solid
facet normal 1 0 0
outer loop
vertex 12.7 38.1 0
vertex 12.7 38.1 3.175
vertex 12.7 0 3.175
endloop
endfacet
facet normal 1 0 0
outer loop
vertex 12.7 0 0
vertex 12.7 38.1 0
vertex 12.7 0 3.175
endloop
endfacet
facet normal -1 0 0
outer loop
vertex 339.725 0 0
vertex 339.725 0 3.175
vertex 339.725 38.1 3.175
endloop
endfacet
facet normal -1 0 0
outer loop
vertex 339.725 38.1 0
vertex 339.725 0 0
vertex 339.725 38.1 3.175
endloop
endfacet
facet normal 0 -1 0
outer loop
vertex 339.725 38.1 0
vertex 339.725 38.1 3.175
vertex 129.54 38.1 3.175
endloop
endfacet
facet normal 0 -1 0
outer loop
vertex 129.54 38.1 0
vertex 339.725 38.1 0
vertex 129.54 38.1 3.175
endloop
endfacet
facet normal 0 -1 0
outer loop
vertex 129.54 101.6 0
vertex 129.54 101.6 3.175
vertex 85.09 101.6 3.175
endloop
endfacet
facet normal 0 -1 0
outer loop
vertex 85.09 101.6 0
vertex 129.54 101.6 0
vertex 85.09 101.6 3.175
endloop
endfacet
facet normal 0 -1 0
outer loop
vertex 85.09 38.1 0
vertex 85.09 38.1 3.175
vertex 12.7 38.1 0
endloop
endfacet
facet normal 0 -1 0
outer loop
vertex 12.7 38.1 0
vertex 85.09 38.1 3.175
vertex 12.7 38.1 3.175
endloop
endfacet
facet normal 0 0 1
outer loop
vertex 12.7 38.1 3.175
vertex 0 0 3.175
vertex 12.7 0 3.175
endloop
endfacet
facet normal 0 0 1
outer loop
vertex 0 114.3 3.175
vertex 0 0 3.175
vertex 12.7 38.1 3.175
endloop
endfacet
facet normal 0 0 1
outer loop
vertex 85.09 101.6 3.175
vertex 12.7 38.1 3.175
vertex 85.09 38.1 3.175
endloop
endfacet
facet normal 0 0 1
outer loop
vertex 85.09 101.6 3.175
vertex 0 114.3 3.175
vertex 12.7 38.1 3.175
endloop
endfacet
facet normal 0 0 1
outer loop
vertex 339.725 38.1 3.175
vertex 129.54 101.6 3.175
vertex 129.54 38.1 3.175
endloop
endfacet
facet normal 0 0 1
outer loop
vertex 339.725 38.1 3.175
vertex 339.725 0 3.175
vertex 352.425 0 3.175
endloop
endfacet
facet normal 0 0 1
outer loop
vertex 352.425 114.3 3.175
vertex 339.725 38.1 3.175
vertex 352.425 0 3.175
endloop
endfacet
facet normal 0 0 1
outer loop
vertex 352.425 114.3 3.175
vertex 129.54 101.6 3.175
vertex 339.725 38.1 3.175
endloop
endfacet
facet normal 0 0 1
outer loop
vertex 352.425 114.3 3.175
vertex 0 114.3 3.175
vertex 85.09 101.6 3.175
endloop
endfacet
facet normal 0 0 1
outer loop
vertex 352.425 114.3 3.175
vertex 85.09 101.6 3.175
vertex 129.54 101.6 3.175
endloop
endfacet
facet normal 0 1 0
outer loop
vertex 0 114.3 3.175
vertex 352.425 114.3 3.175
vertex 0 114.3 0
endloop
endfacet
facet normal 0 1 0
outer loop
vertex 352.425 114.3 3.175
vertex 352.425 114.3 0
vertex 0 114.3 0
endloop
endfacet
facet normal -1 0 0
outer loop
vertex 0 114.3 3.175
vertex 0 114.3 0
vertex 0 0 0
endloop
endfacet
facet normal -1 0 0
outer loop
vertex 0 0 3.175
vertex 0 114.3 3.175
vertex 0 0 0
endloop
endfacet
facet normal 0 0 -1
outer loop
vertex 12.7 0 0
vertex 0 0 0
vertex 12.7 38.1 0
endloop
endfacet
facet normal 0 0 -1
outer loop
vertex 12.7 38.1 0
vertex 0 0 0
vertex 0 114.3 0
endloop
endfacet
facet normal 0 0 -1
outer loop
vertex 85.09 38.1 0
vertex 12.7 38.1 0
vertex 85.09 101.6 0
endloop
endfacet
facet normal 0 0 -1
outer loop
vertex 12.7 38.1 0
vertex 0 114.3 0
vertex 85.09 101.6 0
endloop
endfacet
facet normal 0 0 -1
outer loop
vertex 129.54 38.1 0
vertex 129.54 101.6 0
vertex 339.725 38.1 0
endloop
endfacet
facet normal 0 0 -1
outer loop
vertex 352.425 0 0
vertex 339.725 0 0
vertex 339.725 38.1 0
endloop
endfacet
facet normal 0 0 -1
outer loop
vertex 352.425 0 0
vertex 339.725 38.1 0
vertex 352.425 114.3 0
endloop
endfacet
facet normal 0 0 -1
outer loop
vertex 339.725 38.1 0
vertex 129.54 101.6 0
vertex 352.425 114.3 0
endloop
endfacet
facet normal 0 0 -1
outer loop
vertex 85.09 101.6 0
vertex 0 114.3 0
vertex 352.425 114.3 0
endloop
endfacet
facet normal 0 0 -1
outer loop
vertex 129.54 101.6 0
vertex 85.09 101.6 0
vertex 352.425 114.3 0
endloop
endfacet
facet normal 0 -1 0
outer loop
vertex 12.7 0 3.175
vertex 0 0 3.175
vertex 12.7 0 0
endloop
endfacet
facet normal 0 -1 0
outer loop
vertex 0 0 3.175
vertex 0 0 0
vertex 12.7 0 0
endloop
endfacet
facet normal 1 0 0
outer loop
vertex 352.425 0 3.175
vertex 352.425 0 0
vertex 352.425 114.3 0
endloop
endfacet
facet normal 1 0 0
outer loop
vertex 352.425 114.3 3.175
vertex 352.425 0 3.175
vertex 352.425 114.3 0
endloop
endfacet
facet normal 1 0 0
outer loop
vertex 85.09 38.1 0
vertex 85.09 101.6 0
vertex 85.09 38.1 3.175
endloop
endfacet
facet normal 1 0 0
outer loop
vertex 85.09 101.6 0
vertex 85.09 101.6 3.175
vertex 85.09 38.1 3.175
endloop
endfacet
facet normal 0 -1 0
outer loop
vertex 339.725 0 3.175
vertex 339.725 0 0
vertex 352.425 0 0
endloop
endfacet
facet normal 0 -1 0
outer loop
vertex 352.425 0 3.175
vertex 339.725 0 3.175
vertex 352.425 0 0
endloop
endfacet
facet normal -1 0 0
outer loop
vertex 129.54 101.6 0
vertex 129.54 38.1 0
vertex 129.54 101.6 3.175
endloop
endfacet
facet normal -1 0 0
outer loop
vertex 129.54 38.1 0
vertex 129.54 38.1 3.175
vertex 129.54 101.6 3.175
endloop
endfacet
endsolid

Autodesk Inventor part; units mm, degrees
ref_plane "YZ Plane" through (0, 0, 0) normal (1, 0, 0) x (0, 1, 0)
ref_plane "XZ Plane" through (0, 0, 0) normal (0, 1, 0) x (-1, 0, 0)
ref_plane "XY Plane" through (0, 0, 0) normal (0, 0, 1) x (1, 0, 0)
sketch "Sketch1" plane through (0, 0, 0) normal (0, 0, 1) x (1, 0, 0)
  line L0 (0, 0) -> (352.425, 0)
  line L1 (352.425, 0) -> (352.425, 114.3)
  line L2 (352.425, 114.3) -> (0, 114.3)
  line L3 (0, 114.3) -> (0, 0)
  dimension "d0" = 352.425
  dimension "d1" = 114.3
extrude "Extrusion1" add sketch "Sketch1" along normal blind 3.175
sketch "Sketch2" plane through (0, 0, 3.175) normal (0, 0, 1) x (1, 0, 0)
  line L0 (12.7, 0) -> (339.725, 0)
  line L1 (339.725, 0) -> (339.725, 38.1)
  line L2 (339.725, 38.1) -> (12.7, 38.1)
  line L3 (12.7, 38.1) -> (12.7, 0)
  line L4 (0, 114.3) -> (0, 0) projected
  line L5 (352.425, 0) -> (352.425, 114.3) projected
  dimension "d4" = 12.7
  dimension "d5" = 12.7
  dimension "d6" = 38.1
extrude "Extrusion2" cut sketch "Sketch2" against normal blind 25.4
sketch "Sketch3" plane through (0, 0, 3.175) normal (0, 0, 1) x (1, 0, 0)
  line L0 (339.725, 38.1) -> (12.7, 38.1) projected
  line L1 (85.09, 38.1) -> (129.54, 38.1)
  line L2 (129.54, 38.1) -> (129.54, 101.6)
  line L3 (129.54, 101.6) -> (85.09, 101.6)
  line L4 (85.09, 101.6) -> (85.09, 38.1)
  point P0 (0, 0)
  dimension "d9" = 63.5
  dimension "d10" = 72.39
  dimension "d11" = 44.45
extrude "Extrusion3" cut sketch "Sketch3" against normal blind 25.4
properties part number "SmallWall"
